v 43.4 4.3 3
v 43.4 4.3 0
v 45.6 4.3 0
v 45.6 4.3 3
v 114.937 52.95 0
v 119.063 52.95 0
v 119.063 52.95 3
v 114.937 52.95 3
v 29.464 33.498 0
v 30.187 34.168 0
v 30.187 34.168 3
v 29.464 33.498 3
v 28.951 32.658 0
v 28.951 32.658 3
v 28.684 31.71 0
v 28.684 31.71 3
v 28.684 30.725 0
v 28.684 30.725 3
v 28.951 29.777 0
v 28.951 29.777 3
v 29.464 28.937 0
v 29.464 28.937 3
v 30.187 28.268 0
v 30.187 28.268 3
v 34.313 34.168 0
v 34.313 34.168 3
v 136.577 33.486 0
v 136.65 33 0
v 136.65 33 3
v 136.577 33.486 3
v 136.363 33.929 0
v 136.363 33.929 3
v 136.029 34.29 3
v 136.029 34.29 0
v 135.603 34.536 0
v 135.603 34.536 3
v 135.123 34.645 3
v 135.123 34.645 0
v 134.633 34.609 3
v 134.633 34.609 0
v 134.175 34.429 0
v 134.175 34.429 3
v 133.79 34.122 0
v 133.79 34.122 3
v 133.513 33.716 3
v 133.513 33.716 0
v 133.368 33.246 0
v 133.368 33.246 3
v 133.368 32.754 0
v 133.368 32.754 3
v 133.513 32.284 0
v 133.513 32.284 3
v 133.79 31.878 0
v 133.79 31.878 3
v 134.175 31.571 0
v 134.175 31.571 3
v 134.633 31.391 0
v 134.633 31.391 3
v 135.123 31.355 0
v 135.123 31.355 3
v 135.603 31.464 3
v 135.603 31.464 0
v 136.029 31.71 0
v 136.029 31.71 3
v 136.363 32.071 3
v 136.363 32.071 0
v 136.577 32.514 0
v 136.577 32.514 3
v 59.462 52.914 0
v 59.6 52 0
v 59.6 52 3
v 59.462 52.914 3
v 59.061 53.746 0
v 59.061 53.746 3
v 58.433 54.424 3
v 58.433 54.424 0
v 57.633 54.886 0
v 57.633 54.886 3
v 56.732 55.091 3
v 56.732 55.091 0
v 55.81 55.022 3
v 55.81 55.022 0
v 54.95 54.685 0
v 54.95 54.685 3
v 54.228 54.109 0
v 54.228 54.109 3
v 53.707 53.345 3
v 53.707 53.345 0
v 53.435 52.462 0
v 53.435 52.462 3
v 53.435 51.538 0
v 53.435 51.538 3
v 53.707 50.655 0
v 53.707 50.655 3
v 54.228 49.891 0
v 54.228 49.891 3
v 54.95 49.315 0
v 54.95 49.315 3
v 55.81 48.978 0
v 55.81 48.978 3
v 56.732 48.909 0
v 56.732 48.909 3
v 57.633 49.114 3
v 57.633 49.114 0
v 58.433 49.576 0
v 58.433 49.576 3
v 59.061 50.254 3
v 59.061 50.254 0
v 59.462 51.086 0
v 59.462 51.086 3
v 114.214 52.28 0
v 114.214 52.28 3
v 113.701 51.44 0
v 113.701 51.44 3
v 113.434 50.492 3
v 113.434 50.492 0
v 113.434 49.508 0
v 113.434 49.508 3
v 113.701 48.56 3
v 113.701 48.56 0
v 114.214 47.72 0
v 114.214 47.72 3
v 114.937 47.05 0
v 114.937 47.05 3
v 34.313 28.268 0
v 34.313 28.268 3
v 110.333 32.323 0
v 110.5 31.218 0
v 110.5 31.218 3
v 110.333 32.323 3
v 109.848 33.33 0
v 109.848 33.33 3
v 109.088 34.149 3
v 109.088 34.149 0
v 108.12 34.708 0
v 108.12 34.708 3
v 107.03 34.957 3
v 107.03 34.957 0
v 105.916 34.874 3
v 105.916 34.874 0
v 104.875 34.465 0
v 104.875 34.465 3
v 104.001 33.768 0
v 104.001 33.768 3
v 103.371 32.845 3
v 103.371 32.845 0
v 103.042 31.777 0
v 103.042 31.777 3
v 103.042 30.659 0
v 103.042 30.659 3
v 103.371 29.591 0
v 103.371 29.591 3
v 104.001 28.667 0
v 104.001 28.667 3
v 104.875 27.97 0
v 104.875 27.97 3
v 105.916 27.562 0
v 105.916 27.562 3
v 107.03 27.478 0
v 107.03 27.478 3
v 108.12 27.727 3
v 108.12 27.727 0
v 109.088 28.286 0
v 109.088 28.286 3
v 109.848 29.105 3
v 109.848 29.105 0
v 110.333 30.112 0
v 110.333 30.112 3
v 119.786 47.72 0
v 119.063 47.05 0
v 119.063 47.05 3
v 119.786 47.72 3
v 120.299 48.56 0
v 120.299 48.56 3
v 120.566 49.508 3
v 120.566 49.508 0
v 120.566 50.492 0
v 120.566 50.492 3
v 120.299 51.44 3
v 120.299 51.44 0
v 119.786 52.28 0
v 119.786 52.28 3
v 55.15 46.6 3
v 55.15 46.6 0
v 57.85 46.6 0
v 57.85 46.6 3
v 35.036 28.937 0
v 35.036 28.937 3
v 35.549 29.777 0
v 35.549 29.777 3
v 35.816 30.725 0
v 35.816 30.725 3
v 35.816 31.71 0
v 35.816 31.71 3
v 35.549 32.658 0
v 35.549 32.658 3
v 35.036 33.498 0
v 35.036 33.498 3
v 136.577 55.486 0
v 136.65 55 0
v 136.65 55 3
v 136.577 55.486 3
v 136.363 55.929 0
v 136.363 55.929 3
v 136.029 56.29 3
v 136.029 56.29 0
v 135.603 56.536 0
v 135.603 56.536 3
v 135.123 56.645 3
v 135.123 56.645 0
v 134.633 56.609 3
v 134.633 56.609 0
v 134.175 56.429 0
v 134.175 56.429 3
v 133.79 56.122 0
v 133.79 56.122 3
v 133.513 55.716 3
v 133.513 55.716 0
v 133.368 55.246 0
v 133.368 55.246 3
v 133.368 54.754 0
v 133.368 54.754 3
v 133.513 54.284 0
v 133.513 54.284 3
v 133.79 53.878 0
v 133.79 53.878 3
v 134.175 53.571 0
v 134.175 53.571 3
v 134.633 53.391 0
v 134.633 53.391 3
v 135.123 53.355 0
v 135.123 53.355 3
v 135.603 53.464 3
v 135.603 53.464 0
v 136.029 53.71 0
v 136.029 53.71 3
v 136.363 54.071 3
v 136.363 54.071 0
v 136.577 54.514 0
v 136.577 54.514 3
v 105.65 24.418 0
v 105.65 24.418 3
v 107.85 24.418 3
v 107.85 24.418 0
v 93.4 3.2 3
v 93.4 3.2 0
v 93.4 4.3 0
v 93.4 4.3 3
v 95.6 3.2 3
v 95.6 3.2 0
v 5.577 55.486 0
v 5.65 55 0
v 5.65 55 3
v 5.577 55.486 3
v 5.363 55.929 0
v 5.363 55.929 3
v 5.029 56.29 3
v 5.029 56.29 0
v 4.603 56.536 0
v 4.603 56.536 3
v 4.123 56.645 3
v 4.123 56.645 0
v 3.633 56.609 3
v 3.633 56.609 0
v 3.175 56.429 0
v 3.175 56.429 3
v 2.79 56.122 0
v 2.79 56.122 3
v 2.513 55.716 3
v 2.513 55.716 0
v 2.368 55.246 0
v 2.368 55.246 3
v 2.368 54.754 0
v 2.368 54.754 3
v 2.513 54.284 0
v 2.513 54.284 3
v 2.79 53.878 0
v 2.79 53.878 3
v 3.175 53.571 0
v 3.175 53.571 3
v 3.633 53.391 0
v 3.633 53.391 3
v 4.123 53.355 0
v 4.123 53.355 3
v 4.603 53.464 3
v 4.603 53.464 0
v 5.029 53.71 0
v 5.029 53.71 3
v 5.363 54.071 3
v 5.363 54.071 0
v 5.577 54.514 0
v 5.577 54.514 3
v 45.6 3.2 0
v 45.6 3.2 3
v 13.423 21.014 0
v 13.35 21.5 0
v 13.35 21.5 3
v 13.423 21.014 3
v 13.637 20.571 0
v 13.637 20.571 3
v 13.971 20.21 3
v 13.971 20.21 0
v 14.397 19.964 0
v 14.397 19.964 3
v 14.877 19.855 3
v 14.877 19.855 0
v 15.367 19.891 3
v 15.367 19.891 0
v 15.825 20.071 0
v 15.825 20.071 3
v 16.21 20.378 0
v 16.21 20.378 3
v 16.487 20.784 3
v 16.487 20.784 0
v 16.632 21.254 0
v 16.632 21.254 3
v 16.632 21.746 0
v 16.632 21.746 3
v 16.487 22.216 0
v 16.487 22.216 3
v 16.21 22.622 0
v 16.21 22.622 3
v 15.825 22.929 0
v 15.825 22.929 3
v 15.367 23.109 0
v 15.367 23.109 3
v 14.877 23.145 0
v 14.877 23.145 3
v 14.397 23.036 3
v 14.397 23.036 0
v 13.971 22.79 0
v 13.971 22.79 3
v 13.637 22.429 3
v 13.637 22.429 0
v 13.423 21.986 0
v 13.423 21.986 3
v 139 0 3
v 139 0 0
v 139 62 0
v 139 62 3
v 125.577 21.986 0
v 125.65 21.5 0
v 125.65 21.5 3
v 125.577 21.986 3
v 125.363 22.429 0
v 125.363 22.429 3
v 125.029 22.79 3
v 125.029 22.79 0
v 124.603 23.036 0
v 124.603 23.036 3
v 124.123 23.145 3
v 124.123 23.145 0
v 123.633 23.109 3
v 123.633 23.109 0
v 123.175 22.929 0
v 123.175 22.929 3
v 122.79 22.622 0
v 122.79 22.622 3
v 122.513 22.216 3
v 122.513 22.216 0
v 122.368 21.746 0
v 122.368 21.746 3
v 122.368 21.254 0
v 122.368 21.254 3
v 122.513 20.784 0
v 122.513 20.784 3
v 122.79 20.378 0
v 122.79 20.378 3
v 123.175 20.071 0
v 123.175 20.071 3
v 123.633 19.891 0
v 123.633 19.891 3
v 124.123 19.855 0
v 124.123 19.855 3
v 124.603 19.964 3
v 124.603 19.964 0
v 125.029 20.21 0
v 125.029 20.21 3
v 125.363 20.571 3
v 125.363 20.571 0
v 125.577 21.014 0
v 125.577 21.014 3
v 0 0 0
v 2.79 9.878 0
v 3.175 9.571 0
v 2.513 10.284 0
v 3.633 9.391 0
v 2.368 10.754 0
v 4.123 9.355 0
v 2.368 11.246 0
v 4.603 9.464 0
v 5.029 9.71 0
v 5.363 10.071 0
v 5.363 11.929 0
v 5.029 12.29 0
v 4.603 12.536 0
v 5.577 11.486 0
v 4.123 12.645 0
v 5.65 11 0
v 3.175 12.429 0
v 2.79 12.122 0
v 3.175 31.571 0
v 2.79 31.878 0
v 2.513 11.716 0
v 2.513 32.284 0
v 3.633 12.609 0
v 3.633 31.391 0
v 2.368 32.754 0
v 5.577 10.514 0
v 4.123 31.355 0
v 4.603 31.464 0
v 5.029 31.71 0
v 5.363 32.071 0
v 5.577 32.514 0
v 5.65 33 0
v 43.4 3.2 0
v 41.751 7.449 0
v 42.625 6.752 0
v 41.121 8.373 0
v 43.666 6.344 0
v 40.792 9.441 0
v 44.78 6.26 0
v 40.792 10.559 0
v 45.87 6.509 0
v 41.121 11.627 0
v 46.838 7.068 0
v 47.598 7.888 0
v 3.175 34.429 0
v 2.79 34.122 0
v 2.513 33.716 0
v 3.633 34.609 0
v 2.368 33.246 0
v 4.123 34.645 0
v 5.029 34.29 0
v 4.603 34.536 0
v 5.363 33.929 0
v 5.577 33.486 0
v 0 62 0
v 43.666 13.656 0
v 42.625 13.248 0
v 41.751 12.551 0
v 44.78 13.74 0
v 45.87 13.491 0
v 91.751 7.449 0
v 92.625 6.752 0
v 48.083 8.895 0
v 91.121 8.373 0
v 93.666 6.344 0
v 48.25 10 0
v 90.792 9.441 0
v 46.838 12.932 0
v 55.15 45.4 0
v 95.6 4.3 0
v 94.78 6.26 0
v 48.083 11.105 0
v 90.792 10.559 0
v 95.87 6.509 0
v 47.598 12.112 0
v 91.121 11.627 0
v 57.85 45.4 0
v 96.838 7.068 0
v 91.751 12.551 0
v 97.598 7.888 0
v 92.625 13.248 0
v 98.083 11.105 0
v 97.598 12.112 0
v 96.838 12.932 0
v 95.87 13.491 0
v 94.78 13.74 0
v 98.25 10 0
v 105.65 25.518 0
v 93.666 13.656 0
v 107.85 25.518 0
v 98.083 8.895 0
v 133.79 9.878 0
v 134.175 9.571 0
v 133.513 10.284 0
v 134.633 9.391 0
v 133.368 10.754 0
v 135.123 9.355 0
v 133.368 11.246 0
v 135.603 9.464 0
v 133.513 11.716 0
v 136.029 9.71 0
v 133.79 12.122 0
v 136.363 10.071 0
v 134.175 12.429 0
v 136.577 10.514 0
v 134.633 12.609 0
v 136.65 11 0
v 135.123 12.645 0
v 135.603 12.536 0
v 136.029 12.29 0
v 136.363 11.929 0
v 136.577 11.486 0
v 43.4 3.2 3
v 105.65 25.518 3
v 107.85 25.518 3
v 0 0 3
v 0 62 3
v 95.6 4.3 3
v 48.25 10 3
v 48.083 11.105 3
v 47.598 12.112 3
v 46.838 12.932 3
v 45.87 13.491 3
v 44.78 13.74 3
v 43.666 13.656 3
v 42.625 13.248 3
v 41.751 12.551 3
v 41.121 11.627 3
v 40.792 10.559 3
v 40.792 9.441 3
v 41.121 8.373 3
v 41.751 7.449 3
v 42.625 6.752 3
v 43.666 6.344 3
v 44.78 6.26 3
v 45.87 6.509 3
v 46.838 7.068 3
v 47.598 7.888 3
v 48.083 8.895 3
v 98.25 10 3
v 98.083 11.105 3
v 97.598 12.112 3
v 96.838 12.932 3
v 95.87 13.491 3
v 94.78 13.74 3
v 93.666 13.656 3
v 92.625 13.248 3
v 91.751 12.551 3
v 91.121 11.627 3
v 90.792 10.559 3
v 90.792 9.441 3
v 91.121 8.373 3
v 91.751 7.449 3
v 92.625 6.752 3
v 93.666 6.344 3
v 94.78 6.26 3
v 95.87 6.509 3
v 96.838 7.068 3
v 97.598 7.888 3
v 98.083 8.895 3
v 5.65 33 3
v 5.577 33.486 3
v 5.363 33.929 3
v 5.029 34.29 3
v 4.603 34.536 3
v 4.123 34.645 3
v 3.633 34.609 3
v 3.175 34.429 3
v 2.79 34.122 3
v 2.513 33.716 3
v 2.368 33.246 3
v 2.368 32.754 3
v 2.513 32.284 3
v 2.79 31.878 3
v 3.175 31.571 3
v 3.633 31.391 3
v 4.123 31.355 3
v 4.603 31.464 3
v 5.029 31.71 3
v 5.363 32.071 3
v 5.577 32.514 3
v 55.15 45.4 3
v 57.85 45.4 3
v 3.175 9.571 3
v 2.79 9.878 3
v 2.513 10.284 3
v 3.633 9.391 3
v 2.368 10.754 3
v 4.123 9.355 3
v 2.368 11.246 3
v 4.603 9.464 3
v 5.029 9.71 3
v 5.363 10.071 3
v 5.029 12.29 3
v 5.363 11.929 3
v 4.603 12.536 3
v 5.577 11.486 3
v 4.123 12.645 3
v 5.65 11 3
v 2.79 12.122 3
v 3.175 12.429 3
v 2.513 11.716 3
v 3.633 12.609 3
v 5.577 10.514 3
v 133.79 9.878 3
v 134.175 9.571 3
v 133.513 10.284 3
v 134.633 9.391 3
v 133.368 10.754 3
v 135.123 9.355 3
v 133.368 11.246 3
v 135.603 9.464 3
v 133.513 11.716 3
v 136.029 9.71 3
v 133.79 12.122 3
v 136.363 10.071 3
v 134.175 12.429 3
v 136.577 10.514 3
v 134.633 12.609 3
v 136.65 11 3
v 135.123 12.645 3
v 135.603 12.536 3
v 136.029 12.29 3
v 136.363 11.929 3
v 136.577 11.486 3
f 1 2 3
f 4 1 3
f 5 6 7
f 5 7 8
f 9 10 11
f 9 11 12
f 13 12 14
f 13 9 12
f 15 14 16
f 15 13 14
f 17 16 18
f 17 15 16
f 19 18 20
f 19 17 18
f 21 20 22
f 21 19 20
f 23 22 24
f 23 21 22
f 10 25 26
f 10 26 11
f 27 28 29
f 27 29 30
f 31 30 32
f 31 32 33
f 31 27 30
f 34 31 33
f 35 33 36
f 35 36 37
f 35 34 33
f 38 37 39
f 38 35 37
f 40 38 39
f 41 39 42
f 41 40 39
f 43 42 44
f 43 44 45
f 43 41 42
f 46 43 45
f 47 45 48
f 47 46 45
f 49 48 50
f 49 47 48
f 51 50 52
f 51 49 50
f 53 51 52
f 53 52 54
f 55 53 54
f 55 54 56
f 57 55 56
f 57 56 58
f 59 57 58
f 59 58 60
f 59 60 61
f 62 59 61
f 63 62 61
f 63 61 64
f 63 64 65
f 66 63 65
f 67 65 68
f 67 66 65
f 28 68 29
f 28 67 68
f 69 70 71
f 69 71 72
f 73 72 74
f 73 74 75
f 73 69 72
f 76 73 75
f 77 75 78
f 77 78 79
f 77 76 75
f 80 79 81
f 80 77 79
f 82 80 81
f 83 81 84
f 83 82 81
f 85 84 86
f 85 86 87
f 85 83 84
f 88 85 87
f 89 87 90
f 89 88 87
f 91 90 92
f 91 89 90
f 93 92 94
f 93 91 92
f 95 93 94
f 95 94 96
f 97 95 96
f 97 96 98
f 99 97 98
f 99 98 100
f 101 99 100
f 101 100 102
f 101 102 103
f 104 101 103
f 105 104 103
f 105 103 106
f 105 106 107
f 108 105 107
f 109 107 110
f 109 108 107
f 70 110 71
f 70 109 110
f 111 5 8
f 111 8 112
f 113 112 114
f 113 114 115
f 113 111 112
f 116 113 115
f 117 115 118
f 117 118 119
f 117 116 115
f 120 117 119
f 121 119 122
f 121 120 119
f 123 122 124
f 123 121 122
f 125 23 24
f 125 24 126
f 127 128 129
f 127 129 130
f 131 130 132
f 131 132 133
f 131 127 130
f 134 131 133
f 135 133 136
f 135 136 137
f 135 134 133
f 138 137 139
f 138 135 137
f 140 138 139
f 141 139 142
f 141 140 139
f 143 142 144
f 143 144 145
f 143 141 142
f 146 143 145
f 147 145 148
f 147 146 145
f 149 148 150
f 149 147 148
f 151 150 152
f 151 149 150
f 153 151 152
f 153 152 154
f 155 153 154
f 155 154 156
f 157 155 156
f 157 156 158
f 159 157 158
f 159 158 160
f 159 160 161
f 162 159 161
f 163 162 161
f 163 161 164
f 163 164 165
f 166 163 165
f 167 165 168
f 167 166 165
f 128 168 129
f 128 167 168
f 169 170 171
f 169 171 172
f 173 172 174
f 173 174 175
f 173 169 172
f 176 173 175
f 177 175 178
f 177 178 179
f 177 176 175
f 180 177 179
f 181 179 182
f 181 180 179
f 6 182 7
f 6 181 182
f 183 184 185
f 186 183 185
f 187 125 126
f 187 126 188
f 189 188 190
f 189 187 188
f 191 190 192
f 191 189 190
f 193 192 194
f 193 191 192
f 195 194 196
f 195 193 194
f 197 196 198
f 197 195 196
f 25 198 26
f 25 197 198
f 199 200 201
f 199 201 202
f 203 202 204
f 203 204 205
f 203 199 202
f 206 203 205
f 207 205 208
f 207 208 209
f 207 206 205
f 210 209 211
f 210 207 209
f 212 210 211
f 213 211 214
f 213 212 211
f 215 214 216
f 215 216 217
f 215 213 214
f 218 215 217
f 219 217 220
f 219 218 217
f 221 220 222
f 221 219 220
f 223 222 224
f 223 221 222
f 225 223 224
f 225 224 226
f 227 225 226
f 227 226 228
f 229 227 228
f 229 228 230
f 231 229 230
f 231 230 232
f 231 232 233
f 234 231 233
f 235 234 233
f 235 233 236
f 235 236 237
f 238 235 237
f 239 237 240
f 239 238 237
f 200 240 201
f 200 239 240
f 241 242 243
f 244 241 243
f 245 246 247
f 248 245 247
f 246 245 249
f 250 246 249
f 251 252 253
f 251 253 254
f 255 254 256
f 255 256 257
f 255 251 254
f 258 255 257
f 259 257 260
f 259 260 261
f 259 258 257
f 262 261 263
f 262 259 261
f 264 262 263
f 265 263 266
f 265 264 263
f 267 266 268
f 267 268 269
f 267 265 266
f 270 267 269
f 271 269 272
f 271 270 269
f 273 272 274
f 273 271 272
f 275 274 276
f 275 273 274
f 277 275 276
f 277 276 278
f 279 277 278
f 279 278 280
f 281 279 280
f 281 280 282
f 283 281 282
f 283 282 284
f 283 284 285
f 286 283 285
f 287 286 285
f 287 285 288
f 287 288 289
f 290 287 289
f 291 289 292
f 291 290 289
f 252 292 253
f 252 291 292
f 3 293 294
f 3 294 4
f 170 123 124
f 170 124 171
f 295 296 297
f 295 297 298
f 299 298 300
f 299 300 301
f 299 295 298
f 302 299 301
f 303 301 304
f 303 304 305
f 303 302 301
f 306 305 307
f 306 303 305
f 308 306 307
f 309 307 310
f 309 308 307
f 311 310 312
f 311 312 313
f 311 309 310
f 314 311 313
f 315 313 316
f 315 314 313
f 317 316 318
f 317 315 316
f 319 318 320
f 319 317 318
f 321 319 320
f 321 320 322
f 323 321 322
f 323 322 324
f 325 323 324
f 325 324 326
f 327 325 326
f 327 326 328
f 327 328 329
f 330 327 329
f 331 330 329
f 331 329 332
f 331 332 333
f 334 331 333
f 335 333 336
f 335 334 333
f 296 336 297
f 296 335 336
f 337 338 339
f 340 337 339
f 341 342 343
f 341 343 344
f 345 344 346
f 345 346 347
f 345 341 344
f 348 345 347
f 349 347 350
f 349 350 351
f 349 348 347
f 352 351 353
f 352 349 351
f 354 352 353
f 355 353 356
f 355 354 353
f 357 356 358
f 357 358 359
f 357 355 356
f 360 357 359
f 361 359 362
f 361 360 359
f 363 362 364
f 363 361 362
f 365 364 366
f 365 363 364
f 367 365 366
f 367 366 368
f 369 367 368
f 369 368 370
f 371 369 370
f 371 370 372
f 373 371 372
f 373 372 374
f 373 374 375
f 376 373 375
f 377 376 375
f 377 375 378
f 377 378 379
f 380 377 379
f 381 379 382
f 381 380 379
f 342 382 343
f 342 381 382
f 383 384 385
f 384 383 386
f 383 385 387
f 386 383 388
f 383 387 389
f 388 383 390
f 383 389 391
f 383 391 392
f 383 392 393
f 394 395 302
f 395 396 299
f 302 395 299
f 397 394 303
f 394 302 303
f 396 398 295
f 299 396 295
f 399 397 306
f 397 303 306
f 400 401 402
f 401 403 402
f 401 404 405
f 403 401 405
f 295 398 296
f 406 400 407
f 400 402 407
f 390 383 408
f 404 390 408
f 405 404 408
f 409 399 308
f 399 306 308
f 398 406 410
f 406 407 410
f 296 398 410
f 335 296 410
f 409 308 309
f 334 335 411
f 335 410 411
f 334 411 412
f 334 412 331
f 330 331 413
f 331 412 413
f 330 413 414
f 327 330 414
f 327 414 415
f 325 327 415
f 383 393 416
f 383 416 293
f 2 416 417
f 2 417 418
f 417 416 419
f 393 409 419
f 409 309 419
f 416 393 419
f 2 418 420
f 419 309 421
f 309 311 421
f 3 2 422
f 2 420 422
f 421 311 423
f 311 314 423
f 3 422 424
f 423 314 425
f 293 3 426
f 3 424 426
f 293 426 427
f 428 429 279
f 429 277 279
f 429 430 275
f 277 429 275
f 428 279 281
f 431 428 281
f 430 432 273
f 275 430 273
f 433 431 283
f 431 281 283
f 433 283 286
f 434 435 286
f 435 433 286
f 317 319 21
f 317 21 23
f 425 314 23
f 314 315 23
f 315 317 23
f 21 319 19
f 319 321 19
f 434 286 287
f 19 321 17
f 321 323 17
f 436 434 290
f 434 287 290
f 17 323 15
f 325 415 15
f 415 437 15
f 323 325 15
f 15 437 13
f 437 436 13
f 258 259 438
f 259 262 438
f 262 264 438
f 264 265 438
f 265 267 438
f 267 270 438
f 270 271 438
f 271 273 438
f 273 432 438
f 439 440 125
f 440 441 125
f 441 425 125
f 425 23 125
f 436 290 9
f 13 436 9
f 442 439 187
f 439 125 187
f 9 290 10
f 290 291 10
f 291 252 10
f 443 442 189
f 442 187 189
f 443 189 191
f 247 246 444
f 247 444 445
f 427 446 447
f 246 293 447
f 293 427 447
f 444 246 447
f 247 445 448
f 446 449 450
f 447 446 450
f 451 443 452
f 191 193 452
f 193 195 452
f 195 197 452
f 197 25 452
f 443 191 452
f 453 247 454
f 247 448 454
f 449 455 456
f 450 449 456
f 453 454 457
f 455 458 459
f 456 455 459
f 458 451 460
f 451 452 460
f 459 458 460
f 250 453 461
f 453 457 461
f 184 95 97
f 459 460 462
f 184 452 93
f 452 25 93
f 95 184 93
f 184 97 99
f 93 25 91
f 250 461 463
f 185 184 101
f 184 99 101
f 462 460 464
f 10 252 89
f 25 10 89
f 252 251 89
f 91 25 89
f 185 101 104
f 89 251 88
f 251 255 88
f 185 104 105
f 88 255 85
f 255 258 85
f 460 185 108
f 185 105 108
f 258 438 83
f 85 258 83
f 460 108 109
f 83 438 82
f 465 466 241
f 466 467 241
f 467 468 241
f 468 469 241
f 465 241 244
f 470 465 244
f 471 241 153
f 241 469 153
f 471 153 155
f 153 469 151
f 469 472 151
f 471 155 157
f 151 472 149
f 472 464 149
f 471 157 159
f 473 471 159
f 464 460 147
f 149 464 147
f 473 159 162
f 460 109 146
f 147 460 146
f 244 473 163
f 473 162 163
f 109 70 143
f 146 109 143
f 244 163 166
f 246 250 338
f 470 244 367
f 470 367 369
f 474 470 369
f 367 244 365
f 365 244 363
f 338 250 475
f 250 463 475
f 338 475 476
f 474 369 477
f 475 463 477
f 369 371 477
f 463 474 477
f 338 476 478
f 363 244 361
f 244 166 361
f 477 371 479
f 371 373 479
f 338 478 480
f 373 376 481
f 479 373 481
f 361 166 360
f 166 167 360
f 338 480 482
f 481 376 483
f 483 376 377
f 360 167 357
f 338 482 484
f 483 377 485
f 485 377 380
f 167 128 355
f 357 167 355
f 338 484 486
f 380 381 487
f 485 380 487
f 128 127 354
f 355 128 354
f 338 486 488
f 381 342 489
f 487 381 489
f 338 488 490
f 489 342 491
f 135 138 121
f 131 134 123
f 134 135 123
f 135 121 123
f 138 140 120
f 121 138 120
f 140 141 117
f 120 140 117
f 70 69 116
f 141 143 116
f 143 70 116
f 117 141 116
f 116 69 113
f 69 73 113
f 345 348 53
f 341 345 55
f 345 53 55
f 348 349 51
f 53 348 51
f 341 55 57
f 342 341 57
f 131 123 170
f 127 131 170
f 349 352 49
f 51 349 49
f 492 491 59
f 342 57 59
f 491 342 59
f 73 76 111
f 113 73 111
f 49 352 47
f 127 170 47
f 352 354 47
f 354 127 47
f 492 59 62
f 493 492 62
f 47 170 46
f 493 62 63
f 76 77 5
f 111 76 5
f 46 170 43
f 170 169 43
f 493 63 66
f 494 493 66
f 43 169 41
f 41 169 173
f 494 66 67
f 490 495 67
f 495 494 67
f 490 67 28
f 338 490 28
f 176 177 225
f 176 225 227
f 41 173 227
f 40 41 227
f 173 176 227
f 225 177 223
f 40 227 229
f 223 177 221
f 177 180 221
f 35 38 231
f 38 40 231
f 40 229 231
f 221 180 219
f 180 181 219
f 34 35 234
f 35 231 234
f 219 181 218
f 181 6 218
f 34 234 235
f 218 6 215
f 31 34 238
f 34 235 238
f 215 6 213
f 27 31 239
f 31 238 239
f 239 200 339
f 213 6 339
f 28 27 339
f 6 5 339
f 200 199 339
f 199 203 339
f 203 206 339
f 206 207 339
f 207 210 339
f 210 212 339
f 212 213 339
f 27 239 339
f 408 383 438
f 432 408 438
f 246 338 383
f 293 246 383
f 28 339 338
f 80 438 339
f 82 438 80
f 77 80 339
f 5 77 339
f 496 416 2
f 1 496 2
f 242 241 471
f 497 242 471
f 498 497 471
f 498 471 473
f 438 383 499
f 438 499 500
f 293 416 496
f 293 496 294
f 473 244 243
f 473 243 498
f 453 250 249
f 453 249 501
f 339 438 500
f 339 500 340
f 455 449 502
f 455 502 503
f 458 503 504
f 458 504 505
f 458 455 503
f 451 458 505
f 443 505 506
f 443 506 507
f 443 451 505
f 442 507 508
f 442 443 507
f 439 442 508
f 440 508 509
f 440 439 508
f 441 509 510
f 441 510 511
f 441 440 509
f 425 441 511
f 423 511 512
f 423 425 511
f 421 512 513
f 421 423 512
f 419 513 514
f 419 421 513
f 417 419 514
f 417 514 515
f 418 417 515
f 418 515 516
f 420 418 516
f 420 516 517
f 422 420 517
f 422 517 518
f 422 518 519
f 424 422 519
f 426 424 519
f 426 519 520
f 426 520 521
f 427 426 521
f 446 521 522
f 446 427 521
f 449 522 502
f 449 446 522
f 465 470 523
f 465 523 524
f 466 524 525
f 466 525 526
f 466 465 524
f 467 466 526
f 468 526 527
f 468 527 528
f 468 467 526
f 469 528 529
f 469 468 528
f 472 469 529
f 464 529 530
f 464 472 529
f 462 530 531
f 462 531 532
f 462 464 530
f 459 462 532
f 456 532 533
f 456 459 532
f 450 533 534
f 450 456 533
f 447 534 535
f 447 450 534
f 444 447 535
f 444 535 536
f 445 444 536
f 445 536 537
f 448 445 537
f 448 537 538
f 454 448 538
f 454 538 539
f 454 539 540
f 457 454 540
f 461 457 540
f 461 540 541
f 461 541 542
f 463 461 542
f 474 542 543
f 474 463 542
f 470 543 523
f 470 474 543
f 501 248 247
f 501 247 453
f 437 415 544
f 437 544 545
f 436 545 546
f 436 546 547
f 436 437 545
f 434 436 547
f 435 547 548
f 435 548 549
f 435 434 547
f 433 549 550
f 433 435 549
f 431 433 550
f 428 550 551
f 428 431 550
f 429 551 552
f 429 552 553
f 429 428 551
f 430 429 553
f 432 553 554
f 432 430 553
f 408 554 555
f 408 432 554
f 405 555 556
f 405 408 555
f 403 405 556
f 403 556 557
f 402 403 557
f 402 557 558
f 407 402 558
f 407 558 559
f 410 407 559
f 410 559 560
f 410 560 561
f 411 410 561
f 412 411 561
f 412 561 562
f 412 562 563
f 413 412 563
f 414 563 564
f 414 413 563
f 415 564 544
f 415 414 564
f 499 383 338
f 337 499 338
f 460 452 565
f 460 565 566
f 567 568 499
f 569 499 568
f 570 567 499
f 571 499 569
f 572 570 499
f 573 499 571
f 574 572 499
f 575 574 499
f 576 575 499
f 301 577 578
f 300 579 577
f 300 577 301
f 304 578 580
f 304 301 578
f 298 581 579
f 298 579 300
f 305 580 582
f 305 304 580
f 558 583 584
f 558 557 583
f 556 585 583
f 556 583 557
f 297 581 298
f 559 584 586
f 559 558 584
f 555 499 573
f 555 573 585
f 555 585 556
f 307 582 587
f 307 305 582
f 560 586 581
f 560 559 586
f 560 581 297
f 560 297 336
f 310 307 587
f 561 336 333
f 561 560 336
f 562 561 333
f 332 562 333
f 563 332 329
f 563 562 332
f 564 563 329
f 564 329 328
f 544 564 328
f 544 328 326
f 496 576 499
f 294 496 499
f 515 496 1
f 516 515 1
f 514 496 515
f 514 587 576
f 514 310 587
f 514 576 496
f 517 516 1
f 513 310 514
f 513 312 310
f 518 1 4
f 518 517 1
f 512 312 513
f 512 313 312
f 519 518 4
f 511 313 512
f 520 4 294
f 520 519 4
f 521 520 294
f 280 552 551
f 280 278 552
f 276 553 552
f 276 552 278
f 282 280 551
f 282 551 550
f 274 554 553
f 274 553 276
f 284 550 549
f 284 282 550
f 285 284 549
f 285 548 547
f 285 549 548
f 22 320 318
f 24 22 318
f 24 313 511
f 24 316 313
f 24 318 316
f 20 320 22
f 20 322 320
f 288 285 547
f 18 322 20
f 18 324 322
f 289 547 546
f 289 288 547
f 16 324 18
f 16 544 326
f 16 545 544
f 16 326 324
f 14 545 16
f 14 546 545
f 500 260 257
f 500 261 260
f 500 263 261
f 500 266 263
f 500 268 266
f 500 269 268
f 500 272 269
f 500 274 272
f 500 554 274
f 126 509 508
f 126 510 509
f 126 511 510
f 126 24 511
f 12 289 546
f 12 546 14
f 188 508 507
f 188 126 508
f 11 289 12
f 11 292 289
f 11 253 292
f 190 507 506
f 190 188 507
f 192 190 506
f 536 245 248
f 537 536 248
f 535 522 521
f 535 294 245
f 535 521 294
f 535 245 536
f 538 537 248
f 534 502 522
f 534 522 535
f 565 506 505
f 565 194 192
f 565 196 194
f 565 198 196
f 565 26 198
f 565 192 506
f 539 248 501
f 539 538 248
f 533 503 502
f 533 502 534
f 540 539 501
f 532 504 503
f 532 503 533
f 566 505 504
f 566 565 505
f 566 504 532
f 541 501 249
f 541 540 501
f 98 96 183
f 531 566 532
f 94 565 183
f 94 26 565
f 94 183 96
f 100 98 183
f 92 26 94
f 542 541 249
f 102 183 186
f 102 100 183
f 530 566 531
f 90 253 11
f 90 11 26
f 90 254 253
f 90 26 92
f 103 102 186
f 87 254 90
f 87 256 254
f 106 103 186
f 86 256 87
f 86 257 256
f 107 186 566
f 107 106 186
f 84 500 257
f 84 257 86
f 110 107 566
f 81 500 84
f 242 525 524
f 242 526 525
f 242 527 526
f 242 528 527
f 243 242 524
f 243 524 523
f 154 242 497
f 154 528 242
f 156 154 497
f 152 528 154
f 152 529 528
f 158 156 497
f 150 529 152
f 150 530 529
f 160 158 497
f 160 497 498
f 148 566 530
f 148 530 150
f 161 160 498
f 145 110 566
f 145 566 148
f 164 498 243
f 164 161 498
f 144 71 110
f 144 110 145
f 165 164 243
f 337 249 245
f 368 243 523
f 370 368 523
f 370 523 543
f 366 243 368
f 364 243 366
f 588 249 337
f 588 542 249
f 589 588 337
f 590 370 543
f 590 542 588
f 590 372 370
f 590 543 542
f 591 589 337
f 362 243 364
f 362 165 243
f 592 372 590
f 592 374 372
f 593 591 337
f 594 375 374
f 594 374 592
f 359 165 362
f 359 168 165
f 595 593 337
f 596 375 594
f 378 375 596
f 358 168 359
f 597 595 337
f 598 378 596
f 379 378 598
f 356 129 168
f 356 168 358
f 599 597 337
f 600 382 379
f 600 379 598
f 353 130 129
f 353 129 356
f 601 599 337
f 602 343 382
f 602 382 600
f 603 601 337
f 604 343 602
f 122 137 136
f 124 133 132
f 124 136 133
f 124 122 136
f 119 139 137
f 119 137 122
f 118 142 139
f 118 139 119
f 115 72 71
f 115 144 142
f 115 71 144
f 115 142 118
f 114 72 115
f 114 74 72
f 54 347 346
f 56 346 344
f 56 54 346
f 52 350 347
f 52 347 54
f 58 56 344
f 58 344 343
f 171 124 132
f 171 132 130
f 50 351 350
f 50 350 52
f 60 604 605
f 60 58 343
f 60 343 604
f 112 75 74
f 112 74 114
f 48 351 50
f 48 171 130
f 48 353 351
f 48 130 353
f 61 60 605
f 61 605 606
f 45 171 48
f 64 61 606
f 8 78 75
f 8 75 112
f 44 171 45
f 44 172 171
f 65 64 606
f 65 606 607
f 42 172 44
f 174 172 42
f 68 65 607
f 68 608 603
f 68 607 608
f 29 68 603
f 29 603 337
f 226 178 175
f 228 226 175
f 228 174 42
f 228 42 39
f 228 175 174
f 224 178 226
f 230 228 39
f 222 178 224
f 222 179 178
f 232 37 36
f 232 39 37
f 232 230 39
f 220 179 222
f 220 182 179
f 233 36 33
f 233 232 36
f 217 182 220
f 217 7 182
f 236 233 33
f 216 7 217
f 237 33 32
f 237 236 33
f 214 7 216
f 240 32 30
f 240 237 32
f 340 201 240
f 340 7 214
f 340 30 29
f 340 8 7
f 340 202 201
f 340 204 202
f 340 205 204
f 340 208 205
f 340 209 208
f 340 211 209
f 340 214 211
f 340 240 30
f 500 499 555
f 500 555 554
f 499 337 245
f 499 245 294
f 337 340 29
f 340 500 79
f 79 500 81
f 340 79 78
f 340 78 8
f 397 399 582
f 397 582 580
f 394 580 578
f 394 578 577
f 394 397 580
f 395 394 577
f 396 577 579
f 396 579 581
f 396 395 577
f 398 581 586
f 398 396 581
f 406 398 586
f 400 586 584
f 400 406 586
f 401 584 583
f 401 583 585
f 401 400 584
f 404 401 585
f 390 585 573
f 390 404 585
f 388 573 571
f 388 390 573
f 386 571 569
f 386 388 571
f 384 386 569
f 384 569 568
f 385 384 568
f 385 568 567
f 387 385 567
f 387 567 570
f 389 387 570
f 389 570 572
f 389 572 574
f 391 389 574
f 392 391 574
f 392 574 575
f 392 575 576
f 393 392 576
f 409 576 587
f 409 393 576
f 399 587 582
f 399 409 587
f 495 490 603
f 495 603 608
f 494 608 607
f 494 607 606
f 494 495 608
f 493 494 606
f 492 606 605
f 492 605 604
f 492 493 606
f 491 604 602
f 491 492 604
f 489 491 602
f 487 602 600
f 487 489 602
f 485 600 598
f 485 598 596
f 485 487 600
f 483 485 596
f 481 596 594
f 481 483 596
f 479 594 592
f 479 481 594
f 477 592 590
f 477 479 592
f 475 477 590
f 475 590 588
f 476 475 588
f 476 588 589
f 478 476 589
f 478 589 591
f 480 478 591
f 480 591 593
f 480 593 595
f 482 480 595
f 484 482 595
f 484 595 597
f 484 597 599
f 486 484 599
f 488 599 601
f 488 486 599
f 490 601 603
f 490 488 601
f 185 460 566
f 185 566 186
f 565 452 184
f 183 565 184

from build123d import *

# Parameters (mm, degrees)
SKETCH1_W           = 139
SKETCH1_H           = 62
SKETCH1_R           = 3.75
SKETCH1_R_2         = 1.65
SKETCH1_R_3         = 3.1
SKETCH1_W_2         = 2.2
SKETCH1_H_2         = 1.1
SKETCH1_W_3         = 2.7
SKETCH1_H_3         = 1.2
BOSS_EXTRUDE1_DEPTH = 3


with BuildPart() as part:
    # Sketch1 → Boss-Extrude1 (new body)
    with BuildSketch(Plane.XY):
        with Locations((69.5, 31)):
            Rectangle(SKETCH1_W, SKETCH1_H)
        with Locations((94.5, 10)):
            Circle(SKETCH1_R, mode=Mode.SUBTRACT)
        with Locations((4, 33)):
            Circle(SKETCH1_R_2, mode=Mode.SUBTRACT)
        with Locations((135, 33)):
            Circle(SKETCH1_R_2, mode=Mode.SUBTRACT)
        with Locations((135, 11)):
            Circle(SKETCH1_R_2, mode=Mode.SUBTRACT)
        with Locations((4, 11)):
            Circle(SKETCH1_R_2, mode=Mode.SUBTRACT)
        with Locations((106.75, 31.217622393)):
            Circle(SKETCH1_R, mode=Mode.SUBTRACT)
        with Locations((124, 21.5)):
            Circle(SKETCH1_R_2, mode=Mode.SUBTRACT)
        with Locations((44.5, 10)):
            Circle(SKETCH1_R, mode=Mode.SUBTRACT)
        with Locations(Location((15, 21.5, 0), (0, 0, 180))):
            Circle(SKETCH1_R_2, mode=Mode.SUBTRACT)
        with Locations((56.5, 52)):
            Circle(SKETCH1_R_3, mode=Mode.SUBTRACT)
        with Locations((4, 55)):
            Circle(SKETCH1_R_2, mode=Mode.SUBTRACT)
        with Locations((135, 55)):
            Circle(SKETCH1_R_2, mode=Mode.SUBTRACT)
        with Locations((44.5, 3.75)):
            Rectangle(SKETCH1_W_2, SKETCH1_H_2, mode=Mode.SUBTRACT)
        with Locations((94.5, 3.75)):
            Rectangle(SKETCH1_W_2, SKETCH1_H_2, mode=Mode.SUBTRACT)
        with Locations((106.75, 24.967622393)):
            Rectangle(SKETCH1_W_2, SKETCH1_H_2, mode=Mode.SUBTRACT)
        with Locations((56.5, 46)):
            Rectangle(SKETCH1_W_3, SKETCH1_H_3, mode=Mode.SUBTRACT)
        with BuildLine():
            Line((114.936628972, 47.05), (119.063371028, 47.05))
            ThreePointArc((119.063371028, 47.05), (120.6, 50), (119.063371028, 52.95))
            Line((119.063371028, 52.95), (114.936628972, 52.95))
            ThreePointArc((114.936628972, 52.95), (113.4, 50), (114.936628972, 47.05))
        make_face(mode=Mode.SUBTRACT)
        with BuildLine():
            Line((30.186628972, 28.267622393), (34.313371028, 28.267622393))
            ThreePointArc((34.313371028, 28.267622393), (35.85, 31.217622393), (34.313371028, 34.167622393))
            Line((34.313371028, 34.167622393), (30.186628972, 34.167622393))
            ThreePointArc((30.186628972, 34.167622393), (28.65, 31.217622393), (30.186628972, 28.267622393))
        make_face(mode=Mode.SUBTRACT)
    extrude(amount=BOSS_EXTRUDE1_DEPTH)


solid = part.part
